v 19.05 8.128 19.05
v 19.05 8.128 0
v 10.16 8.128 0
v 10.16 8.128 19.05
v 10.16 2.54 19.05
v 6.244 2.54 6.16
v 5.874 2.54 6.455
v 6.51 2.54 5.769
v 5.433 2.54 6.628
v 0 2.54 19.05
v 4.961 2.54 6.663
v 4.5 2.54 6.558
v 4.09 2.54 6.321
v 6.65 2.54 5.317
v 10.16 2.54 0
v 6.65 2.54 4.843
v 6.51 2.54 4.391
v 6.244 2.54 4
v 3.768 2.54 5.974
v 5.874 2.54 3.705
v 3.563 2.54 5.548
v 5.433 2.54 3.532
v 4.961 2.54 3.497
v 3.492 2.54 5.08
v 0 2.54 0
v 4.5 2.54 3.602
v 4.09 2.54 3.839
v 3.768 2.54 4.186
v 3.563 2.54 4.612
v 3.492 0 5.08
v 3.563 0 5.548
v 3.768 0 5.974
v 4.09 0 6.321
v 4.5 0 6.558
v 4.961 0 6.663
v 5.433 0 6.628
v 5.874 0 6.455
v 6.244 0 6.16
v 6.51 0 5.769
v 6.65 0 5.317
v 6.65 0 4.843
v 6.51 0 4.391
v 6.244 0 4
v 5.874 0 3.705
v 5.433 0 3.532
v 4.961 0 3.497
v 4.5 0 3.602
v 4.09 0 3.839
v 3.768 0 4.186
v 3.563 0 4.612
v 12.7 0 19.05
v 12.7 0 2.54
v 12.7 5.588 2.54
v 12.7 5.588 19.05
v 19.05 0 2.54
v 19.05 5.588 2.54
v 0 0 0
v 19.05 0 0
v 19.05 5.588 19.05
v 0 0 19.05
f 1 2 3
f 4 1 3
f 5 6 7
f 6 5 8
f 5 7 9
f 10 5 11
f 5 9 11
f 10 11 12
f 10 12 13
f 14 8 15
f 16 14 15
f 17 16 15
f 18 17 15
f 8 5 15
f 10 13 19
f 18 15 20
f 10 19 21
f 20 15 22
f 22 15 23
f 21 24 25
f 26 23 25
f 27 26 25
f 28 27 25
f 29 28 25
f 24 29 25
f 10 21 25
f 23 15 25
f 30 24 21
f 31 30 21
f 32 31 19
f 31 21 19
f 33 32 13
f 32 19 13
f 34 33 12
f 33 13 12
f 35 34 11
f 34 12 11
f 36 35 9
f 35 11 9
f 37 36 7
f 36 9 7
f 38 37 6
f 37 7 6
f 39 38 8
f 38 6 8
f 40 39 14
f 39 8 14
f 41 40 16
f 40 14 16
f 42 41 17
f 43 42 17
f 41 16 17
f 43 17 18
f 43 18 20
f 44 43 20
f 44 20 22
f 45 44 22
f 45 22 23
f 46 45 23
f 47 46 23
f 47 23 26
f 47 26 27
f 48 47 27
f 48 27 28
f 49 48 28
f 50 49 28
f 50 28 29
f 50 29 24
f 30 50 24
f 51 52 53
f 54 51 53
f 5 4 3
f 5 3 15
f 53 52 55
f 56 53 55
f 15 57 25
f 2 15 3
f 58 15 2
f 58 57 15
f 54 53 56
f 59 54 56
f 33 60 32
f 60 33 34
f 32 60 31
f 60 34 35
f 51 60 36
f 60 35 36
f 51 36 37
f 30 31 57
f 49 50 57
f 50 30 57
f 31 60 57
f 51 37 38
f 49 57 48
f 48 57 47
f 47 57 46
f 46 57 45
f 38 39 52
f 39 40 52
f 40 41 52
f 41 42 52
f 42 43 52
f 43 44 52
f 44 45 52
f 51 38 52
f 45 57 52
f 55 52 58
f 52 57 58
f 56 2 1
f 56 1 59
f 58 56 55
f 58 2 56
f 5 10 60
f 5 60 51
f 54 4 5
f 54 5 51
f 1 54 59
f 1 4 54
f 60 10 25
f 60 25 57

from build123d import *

# Parameters (mm, degrees)
F0_W     = 6.35
F0_H     = 2.54
F1_DEPTH = 19.05
F2_W     = 6.35
F2_H     = 5.588
F3_DEPTH = 2.54
F4_R     = 1.5875
F5_DEPTH = 25.4


with BuildPart() as f1:
    # F0 (on Top) → F1 (new body)
    with BuildSketch(Plane.XY):
        with Locations((15.875, 6.858)):
            Rectangle(F0_W, F0_H)
        Polygon((10.16, 2.54), (12.7, 2.54), (12.7, 5.588), (12.7, 8.128), (10.16, 8.128), align=None)
        Polygon((0, 2.54), (0, 0), (12.7, 0), (12.7, 2.54), (10.16, 2.54), align=None)
    extrude(amount=F1_DEPTH)

    # F2 (on face) → F3 (join)
    with BuildSketch(Plane(origin=(0, 0, 0), x_dir=(1, 0, 0), z_dir=(0, 0, -1))):
        with Locations((15.875, -2.794)):
            Rectangle(F2_W, F2_H)
    extrude(amount=-F3_DEPTH)

    # F4 (on face) → F5 (cut)
    with BuildSketch(Plane(origin=(0, 2.54, 0), x_dir=(-1, 0, 0), z_dir=(0, 1, 0))):
        with Locations((-5.08, 5.08)):
            Circle(F4_R)
    extrude(amount=-F5_DEPTH, mode=Mode.SUBTRACT)


solid = f1.part
